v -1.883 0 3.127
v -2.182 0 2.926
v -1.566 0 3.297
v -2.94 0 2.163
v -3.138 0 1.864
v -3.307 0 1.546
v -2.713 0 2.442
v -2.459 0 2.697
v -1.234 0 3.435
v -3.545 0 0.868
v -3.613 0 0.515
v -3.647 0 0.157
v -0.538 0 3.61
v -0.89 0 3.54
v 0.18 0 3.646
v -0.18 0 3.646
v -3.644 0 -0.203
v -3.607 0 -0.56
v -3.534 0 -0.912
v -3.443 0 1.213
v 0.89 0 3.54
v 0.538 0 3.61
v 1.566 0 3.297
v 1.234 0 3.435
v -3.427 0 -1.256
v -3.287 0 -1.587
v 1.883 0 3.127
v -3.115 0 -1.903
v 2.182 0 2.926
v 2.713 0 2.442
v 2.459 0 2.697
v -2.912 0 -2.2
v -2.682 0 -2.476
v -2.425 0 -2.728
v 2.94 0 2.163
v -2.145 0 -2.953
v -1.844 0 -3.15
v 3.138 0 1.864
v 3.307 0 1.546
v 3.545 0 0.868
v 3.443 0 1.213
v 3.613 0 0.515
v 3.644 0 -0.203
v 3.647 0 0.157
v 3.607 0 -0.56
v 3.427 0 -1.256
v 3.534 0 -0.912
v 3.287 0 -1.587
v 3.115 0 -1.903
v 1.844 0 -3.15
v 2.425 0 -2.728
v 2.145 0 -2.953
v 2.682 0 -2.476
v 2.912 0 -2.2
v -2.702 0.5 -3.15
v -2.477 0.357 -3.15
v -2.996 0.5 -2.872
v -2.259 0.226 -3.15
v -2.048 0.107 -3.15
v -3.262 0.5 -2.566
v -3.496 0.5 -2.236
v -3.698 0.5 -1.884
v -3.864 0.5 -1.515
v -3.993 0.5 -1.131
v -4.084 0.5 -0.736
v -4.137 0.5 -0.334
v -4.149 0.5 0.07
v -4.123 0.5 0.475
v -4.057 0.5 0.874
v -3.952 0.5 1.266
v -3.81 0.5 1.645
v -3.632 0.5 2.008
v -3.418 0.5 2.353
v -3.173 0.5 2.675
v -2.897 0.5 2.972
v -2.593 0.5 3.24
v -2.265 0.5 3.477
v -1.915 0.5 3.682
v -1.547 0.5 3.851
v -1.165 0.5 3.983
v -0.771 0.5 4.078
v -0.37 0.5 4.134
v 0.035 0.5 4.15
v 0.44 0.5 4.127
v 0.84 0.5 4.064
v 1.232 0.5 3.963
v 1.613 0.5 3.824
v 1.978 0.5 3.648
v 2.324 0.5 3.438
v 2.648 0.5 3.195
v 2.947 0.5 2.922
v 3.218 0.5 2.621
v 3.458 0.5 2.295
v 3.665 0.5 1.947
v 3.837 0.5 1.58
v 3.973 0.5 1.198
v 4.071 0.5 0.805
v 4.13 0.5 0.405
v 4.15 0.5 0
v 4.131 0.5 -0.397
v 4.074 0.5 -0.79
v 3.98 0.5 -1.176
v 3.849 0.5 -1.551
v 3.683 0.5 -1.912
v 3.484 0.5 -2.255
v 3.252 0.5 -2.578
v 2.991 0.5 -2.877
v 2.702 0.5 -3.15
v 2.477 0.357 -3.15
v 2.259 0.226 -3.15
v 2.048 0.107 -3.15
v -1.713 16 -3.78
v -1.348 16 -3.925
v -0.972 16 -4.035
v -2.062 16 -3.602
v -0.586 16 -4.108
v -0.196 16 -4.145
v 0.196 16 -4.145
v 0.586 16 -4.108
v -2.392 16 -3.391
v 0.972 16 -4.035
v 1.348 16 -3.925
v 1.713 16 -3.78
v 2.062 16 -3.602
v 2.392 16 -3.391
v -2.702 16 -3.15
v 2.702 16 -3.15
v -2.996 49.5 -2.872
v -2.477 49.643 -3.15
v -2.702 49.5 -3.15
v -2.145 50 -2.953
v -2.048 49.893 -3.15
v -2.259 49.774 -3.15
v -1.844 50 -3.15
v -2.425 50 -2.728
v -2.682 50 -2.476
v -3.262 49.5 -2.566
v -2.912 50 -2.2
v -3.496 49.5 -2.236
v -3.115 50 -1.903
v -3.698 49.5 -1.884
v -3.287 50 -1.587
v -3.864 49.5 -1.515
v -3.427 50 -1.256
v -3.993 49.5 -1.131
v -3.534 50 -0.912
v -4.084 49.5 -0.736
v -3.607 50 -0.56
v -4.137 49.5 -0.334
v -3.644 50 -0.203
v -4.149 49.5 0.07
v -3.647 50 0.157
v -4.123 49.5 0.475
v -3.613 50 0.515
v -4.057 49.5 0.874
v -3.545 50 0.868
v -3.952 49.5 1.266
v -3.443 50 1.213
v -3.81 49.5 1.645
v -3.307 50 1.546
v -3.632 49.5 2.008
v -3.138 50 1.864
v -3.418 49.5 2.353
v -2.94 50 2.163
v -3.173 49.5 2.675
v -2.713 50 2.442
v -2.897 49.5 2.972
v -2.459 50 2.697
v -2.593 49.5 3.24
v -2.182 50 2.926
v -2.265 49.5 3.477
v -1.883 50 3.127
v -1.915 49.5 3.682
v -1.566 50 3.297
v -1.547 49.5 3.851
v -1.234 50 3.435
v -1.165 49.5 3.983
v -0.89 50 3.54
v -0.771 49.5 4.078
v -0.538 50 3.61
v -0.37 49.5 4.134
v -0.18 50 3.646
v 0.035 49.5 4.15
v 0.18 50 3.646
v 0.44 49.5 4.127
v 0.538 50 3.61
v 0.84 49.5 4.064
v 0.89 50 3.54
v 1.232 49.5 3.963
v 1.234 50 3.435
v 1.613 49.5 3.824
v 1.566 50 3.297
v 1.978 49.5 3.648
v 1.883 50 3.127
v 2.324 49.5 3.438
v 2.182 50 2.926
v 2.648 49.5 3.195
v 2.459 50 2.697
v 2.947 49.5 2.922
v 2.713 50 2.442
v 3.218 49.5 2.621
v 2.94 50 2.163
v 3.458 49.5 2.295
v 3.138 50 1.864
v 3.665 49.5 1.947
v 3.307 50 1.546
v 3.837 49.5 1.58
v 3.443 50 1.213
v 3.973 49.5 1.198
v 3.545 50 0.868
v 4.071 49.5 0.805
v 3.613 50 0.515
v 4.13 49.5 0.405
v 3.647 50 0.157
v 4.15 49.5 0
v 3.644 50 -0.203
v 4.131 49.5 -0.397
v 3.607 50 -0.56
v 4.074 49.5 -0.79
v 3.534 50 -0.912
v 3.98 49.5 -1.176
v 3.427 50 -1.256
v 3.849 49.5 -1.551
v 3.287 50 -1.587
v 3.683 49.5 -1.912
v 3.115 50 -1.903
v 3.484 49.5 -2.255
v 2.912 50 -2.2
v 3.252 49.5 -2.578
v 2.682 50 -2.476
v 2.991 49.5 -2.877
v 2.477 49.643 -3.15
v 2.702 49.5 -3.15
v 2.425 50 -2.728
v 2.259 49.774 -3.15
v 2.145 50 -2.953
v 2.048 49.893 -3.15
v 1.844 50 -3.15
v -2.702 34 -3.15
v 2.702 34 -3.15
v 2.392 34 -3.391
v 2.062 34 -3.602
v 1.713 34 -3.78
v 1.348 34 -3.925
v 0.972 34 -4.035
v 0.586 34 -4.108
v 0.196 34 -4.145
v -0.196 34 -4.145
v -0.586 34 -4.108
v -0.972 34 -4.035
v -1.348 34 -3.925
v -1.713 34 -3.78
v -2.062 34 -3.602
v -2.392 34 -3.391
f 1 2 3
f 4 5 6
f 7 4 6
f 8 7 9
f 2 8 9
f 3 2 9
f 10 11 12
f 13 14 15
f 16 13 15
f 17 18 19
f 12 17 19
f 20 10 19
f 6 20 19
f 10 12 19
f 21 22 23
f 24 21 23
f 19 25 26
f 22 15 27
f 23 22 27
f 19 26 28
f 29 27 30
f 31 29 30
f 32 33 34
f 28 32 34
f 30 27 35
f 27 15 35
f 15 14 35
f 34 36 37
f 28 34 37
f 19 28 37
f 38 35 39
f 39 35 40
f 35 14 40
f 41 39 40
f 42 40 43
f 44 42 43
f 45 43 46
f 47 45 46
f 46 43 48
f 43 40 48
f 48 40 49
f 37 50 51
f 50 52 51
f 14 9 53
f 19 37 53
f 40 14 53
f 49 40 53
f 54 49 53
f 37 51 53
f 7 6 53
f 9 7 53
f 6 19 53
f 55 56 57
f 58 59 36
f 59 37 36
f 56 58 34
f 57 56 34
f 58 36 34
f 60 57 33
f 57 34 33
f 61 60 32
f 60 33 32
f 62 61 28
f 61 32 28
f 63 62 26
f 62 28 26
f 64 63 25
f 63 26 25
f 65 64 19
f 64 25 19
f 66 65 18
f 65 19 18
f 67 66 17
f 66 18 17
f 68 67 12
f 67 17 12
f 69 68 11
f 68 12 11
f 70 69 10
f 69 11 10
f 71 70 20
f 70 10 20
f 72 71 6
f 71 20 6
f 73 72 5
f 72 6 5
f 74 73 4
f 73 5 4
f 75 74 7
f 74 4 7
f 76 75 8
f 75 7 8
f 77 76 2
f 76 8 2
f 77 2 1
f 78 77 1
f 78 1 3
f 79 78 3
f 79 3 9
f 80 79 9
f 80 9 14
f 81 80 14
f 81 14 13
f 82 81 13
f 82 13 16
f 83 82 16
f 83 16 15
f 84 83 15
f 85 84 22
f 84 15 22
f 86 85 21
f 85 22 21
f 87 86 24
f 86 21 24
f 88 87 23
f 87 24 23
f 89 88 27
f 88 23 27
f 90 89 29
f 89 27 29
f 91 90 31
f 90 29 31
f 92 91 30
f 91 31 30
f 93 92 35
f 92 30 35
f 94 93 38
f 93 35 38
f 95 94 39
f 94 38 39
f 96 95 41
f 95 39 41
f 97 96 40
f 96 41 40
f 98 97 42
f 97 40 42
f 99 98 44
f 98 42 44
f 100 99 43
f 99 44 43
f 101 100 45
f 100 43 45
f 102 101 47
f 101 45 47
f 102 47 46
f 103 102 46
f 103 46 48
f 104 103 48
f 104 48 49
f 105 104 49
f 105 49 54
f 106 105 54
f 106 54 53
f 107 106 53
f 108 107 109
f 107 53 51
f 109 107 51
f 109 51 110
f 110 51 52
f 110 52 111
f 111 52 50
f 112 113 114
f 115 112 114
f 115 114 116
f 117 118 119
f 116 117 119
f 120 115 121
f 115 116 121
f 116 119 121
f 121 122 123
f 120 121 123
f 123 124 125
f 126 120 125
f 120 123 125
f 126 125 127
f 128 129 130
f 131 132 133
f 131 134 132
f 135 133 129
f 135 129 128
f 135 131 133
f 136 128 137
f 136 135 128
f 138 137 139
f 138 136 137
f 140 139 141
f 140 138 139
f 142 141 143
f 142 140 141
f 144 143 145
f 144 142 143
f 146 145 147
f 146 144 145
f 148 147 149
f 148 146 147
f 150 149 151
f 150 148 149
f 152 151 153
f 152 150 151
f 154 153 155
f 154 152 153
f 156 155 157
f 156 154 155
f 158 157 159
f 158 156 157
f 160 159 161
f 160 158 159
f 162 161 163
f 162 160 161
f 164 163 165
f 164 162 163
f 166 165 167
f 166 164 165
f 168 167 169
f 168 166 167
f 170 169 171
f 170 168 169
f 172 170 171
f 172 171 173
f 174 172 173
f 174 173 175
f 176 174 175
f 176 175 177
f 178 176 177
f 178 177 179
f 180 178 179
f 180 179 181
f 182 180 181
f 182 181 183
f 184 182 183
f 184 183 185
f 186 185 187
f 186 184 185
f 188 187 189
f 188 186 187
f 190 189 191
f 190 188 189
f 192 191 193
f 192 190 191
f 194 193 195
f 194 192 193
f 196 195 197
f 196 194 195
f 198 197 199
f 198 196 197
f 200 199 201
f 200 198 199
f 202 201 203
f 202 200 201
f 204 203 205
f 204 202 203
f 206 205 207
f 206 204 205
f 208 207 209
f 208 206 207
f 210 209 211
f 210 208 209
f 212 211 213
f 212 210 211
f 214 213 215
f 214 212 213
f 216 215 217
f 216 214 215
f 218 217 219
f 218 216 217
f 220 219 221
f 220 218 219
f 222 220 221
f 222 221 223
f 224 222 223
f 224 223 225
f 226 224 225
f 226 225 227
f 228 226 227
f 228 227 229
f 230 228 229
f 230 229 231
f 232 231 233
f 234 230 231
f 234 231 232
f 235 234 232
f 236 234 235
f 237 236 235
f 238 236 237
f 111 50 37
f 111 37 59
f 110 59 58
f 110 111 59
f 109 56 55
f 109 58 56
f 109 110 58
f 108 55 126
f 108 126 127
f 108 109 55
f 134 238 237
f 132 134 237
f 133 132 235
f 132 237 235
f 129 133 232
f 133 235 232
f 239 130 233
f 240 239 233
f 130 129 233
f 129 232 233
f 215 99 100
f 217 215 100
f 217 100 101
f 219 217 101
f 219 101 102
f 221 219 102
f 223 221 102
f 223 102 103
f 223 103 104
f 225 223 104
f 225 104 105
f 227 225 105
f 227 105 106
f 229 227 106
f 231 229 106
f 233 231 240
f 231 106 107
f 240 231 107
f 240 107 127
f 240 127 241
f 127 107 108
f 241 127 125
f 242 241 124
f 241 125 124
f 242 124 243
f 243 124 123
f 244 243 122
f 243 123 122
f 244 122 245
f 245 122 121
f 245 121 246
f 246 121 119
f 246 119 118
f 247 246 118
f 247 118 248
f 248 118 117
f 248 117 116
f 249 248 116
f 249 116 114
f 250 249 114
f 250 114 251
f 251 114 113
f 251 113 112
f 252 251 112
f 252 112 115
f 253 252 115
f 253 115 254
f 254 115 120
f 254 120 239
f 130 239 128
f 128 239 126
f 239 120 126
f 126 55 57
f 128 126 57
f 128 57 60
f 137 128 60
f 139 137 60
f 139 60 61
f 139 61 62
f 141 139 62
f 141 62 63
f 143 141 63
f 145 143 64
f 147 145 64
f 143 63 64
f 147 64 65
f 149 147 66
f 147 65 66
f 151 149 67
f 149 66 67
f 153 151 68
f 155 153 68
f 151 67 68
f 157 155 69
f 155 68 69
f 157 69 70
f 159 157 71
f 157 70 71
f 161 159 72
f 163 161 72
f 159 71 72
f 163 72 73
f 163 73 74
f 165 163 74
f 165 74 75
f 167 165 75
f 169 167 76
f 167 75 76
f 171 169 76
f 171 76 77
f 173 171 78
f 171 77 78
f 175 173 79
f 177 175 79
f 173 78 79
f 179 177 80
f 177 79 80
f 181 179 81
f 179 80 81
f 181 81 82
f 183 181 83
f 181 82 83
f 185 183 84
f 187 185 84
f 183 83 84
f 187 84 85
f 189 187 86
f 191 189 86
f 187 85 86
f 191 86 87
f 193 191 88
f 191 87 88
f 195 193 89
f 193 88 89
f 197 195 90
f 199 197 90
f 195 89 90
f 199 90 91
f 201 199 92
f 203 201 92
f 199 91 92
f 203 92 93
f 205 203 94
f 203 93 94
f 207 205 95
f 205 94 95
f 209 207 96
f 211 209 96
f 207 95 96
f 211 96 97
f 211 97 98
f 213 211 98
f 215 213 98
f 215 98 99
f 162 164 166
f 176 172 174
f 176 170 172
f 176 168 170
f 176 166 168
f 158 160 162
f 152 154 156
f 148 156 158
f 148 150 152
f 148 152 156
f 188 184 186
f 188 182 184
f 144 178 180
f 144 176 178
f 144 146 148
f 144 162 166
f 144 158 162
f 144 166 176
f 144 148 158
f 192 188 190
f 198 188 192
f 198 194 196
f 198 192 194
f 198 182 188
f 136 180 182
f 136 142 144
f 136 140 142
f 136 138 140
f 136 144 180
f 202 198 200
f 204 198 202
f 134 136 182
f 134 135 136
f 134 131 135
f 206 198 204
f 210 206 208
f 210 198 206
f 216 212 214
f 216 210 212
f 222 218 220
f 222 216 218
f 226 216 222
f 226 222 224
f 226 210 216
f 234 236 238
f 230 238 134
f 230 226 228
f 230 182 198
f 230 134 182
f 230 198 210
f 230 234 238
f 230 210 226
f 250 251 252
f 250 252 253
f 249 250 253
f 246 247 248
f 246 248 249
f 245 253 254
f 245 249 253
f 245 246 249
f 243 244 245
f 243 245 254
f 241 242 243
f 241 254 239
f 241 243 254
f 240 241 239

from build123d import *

# Parameters (mm, degrees)
SKETCH1_R           = 4.15
BOSS_EXTRUDE1_DEPTH = 50
CUT_EXTRUDE1_DEPTH  = 16
CHAMFER1_SIZE       = 0.5


with BuildPart() as part:
    # Sketch1 → Boss-Extrude1 (new body)
    with BuildSketch(Plane(origin=(0, 0, 0), x_dir=(1, 0, 0), z_dir=(0, 1, 0))):
        Circle(SKETCH1_R)
    extrude(amount=BOSS_EXTRUDE1_DEPTH)

    # Sketch2 → Cut-Extrude1 (cut)
    with BuildSketch(Plane(origin=(0, 50, 0), x_dir=(1, 0, 0), z_dir=(0, 1, 0))):
        with BuildLine():
            Line((-2.701851217, 3.15), (2.701851217, 3.15))
            ThreePointArc((2.701851217, 3.15), (0, 4.15), (-2.701851217, 3.15))
        make_face()
    cut_extrude1 = extrude(amount=-CUT_EXTRUDE1_DEPTH, mode=Mode.SUBTRACT)

    # Mirror1: Cut-Extrude1 across plane
    add(cut_extrude1.mirror(Plane.ZX.offset(25)), mode=Mode.SUBTRACT)

    # Chamfer1
    chamfer1_edges = [part.edges().sort_by_distance(p)[0] for p in [
        (-1.733467255, 0, 3.770622134),
        (-1.733467255, 50, 3.770622134),
    ]]
    chamfer(chamfer1_edges, length=CHAMFER1_SIZE)


solid = part.part
